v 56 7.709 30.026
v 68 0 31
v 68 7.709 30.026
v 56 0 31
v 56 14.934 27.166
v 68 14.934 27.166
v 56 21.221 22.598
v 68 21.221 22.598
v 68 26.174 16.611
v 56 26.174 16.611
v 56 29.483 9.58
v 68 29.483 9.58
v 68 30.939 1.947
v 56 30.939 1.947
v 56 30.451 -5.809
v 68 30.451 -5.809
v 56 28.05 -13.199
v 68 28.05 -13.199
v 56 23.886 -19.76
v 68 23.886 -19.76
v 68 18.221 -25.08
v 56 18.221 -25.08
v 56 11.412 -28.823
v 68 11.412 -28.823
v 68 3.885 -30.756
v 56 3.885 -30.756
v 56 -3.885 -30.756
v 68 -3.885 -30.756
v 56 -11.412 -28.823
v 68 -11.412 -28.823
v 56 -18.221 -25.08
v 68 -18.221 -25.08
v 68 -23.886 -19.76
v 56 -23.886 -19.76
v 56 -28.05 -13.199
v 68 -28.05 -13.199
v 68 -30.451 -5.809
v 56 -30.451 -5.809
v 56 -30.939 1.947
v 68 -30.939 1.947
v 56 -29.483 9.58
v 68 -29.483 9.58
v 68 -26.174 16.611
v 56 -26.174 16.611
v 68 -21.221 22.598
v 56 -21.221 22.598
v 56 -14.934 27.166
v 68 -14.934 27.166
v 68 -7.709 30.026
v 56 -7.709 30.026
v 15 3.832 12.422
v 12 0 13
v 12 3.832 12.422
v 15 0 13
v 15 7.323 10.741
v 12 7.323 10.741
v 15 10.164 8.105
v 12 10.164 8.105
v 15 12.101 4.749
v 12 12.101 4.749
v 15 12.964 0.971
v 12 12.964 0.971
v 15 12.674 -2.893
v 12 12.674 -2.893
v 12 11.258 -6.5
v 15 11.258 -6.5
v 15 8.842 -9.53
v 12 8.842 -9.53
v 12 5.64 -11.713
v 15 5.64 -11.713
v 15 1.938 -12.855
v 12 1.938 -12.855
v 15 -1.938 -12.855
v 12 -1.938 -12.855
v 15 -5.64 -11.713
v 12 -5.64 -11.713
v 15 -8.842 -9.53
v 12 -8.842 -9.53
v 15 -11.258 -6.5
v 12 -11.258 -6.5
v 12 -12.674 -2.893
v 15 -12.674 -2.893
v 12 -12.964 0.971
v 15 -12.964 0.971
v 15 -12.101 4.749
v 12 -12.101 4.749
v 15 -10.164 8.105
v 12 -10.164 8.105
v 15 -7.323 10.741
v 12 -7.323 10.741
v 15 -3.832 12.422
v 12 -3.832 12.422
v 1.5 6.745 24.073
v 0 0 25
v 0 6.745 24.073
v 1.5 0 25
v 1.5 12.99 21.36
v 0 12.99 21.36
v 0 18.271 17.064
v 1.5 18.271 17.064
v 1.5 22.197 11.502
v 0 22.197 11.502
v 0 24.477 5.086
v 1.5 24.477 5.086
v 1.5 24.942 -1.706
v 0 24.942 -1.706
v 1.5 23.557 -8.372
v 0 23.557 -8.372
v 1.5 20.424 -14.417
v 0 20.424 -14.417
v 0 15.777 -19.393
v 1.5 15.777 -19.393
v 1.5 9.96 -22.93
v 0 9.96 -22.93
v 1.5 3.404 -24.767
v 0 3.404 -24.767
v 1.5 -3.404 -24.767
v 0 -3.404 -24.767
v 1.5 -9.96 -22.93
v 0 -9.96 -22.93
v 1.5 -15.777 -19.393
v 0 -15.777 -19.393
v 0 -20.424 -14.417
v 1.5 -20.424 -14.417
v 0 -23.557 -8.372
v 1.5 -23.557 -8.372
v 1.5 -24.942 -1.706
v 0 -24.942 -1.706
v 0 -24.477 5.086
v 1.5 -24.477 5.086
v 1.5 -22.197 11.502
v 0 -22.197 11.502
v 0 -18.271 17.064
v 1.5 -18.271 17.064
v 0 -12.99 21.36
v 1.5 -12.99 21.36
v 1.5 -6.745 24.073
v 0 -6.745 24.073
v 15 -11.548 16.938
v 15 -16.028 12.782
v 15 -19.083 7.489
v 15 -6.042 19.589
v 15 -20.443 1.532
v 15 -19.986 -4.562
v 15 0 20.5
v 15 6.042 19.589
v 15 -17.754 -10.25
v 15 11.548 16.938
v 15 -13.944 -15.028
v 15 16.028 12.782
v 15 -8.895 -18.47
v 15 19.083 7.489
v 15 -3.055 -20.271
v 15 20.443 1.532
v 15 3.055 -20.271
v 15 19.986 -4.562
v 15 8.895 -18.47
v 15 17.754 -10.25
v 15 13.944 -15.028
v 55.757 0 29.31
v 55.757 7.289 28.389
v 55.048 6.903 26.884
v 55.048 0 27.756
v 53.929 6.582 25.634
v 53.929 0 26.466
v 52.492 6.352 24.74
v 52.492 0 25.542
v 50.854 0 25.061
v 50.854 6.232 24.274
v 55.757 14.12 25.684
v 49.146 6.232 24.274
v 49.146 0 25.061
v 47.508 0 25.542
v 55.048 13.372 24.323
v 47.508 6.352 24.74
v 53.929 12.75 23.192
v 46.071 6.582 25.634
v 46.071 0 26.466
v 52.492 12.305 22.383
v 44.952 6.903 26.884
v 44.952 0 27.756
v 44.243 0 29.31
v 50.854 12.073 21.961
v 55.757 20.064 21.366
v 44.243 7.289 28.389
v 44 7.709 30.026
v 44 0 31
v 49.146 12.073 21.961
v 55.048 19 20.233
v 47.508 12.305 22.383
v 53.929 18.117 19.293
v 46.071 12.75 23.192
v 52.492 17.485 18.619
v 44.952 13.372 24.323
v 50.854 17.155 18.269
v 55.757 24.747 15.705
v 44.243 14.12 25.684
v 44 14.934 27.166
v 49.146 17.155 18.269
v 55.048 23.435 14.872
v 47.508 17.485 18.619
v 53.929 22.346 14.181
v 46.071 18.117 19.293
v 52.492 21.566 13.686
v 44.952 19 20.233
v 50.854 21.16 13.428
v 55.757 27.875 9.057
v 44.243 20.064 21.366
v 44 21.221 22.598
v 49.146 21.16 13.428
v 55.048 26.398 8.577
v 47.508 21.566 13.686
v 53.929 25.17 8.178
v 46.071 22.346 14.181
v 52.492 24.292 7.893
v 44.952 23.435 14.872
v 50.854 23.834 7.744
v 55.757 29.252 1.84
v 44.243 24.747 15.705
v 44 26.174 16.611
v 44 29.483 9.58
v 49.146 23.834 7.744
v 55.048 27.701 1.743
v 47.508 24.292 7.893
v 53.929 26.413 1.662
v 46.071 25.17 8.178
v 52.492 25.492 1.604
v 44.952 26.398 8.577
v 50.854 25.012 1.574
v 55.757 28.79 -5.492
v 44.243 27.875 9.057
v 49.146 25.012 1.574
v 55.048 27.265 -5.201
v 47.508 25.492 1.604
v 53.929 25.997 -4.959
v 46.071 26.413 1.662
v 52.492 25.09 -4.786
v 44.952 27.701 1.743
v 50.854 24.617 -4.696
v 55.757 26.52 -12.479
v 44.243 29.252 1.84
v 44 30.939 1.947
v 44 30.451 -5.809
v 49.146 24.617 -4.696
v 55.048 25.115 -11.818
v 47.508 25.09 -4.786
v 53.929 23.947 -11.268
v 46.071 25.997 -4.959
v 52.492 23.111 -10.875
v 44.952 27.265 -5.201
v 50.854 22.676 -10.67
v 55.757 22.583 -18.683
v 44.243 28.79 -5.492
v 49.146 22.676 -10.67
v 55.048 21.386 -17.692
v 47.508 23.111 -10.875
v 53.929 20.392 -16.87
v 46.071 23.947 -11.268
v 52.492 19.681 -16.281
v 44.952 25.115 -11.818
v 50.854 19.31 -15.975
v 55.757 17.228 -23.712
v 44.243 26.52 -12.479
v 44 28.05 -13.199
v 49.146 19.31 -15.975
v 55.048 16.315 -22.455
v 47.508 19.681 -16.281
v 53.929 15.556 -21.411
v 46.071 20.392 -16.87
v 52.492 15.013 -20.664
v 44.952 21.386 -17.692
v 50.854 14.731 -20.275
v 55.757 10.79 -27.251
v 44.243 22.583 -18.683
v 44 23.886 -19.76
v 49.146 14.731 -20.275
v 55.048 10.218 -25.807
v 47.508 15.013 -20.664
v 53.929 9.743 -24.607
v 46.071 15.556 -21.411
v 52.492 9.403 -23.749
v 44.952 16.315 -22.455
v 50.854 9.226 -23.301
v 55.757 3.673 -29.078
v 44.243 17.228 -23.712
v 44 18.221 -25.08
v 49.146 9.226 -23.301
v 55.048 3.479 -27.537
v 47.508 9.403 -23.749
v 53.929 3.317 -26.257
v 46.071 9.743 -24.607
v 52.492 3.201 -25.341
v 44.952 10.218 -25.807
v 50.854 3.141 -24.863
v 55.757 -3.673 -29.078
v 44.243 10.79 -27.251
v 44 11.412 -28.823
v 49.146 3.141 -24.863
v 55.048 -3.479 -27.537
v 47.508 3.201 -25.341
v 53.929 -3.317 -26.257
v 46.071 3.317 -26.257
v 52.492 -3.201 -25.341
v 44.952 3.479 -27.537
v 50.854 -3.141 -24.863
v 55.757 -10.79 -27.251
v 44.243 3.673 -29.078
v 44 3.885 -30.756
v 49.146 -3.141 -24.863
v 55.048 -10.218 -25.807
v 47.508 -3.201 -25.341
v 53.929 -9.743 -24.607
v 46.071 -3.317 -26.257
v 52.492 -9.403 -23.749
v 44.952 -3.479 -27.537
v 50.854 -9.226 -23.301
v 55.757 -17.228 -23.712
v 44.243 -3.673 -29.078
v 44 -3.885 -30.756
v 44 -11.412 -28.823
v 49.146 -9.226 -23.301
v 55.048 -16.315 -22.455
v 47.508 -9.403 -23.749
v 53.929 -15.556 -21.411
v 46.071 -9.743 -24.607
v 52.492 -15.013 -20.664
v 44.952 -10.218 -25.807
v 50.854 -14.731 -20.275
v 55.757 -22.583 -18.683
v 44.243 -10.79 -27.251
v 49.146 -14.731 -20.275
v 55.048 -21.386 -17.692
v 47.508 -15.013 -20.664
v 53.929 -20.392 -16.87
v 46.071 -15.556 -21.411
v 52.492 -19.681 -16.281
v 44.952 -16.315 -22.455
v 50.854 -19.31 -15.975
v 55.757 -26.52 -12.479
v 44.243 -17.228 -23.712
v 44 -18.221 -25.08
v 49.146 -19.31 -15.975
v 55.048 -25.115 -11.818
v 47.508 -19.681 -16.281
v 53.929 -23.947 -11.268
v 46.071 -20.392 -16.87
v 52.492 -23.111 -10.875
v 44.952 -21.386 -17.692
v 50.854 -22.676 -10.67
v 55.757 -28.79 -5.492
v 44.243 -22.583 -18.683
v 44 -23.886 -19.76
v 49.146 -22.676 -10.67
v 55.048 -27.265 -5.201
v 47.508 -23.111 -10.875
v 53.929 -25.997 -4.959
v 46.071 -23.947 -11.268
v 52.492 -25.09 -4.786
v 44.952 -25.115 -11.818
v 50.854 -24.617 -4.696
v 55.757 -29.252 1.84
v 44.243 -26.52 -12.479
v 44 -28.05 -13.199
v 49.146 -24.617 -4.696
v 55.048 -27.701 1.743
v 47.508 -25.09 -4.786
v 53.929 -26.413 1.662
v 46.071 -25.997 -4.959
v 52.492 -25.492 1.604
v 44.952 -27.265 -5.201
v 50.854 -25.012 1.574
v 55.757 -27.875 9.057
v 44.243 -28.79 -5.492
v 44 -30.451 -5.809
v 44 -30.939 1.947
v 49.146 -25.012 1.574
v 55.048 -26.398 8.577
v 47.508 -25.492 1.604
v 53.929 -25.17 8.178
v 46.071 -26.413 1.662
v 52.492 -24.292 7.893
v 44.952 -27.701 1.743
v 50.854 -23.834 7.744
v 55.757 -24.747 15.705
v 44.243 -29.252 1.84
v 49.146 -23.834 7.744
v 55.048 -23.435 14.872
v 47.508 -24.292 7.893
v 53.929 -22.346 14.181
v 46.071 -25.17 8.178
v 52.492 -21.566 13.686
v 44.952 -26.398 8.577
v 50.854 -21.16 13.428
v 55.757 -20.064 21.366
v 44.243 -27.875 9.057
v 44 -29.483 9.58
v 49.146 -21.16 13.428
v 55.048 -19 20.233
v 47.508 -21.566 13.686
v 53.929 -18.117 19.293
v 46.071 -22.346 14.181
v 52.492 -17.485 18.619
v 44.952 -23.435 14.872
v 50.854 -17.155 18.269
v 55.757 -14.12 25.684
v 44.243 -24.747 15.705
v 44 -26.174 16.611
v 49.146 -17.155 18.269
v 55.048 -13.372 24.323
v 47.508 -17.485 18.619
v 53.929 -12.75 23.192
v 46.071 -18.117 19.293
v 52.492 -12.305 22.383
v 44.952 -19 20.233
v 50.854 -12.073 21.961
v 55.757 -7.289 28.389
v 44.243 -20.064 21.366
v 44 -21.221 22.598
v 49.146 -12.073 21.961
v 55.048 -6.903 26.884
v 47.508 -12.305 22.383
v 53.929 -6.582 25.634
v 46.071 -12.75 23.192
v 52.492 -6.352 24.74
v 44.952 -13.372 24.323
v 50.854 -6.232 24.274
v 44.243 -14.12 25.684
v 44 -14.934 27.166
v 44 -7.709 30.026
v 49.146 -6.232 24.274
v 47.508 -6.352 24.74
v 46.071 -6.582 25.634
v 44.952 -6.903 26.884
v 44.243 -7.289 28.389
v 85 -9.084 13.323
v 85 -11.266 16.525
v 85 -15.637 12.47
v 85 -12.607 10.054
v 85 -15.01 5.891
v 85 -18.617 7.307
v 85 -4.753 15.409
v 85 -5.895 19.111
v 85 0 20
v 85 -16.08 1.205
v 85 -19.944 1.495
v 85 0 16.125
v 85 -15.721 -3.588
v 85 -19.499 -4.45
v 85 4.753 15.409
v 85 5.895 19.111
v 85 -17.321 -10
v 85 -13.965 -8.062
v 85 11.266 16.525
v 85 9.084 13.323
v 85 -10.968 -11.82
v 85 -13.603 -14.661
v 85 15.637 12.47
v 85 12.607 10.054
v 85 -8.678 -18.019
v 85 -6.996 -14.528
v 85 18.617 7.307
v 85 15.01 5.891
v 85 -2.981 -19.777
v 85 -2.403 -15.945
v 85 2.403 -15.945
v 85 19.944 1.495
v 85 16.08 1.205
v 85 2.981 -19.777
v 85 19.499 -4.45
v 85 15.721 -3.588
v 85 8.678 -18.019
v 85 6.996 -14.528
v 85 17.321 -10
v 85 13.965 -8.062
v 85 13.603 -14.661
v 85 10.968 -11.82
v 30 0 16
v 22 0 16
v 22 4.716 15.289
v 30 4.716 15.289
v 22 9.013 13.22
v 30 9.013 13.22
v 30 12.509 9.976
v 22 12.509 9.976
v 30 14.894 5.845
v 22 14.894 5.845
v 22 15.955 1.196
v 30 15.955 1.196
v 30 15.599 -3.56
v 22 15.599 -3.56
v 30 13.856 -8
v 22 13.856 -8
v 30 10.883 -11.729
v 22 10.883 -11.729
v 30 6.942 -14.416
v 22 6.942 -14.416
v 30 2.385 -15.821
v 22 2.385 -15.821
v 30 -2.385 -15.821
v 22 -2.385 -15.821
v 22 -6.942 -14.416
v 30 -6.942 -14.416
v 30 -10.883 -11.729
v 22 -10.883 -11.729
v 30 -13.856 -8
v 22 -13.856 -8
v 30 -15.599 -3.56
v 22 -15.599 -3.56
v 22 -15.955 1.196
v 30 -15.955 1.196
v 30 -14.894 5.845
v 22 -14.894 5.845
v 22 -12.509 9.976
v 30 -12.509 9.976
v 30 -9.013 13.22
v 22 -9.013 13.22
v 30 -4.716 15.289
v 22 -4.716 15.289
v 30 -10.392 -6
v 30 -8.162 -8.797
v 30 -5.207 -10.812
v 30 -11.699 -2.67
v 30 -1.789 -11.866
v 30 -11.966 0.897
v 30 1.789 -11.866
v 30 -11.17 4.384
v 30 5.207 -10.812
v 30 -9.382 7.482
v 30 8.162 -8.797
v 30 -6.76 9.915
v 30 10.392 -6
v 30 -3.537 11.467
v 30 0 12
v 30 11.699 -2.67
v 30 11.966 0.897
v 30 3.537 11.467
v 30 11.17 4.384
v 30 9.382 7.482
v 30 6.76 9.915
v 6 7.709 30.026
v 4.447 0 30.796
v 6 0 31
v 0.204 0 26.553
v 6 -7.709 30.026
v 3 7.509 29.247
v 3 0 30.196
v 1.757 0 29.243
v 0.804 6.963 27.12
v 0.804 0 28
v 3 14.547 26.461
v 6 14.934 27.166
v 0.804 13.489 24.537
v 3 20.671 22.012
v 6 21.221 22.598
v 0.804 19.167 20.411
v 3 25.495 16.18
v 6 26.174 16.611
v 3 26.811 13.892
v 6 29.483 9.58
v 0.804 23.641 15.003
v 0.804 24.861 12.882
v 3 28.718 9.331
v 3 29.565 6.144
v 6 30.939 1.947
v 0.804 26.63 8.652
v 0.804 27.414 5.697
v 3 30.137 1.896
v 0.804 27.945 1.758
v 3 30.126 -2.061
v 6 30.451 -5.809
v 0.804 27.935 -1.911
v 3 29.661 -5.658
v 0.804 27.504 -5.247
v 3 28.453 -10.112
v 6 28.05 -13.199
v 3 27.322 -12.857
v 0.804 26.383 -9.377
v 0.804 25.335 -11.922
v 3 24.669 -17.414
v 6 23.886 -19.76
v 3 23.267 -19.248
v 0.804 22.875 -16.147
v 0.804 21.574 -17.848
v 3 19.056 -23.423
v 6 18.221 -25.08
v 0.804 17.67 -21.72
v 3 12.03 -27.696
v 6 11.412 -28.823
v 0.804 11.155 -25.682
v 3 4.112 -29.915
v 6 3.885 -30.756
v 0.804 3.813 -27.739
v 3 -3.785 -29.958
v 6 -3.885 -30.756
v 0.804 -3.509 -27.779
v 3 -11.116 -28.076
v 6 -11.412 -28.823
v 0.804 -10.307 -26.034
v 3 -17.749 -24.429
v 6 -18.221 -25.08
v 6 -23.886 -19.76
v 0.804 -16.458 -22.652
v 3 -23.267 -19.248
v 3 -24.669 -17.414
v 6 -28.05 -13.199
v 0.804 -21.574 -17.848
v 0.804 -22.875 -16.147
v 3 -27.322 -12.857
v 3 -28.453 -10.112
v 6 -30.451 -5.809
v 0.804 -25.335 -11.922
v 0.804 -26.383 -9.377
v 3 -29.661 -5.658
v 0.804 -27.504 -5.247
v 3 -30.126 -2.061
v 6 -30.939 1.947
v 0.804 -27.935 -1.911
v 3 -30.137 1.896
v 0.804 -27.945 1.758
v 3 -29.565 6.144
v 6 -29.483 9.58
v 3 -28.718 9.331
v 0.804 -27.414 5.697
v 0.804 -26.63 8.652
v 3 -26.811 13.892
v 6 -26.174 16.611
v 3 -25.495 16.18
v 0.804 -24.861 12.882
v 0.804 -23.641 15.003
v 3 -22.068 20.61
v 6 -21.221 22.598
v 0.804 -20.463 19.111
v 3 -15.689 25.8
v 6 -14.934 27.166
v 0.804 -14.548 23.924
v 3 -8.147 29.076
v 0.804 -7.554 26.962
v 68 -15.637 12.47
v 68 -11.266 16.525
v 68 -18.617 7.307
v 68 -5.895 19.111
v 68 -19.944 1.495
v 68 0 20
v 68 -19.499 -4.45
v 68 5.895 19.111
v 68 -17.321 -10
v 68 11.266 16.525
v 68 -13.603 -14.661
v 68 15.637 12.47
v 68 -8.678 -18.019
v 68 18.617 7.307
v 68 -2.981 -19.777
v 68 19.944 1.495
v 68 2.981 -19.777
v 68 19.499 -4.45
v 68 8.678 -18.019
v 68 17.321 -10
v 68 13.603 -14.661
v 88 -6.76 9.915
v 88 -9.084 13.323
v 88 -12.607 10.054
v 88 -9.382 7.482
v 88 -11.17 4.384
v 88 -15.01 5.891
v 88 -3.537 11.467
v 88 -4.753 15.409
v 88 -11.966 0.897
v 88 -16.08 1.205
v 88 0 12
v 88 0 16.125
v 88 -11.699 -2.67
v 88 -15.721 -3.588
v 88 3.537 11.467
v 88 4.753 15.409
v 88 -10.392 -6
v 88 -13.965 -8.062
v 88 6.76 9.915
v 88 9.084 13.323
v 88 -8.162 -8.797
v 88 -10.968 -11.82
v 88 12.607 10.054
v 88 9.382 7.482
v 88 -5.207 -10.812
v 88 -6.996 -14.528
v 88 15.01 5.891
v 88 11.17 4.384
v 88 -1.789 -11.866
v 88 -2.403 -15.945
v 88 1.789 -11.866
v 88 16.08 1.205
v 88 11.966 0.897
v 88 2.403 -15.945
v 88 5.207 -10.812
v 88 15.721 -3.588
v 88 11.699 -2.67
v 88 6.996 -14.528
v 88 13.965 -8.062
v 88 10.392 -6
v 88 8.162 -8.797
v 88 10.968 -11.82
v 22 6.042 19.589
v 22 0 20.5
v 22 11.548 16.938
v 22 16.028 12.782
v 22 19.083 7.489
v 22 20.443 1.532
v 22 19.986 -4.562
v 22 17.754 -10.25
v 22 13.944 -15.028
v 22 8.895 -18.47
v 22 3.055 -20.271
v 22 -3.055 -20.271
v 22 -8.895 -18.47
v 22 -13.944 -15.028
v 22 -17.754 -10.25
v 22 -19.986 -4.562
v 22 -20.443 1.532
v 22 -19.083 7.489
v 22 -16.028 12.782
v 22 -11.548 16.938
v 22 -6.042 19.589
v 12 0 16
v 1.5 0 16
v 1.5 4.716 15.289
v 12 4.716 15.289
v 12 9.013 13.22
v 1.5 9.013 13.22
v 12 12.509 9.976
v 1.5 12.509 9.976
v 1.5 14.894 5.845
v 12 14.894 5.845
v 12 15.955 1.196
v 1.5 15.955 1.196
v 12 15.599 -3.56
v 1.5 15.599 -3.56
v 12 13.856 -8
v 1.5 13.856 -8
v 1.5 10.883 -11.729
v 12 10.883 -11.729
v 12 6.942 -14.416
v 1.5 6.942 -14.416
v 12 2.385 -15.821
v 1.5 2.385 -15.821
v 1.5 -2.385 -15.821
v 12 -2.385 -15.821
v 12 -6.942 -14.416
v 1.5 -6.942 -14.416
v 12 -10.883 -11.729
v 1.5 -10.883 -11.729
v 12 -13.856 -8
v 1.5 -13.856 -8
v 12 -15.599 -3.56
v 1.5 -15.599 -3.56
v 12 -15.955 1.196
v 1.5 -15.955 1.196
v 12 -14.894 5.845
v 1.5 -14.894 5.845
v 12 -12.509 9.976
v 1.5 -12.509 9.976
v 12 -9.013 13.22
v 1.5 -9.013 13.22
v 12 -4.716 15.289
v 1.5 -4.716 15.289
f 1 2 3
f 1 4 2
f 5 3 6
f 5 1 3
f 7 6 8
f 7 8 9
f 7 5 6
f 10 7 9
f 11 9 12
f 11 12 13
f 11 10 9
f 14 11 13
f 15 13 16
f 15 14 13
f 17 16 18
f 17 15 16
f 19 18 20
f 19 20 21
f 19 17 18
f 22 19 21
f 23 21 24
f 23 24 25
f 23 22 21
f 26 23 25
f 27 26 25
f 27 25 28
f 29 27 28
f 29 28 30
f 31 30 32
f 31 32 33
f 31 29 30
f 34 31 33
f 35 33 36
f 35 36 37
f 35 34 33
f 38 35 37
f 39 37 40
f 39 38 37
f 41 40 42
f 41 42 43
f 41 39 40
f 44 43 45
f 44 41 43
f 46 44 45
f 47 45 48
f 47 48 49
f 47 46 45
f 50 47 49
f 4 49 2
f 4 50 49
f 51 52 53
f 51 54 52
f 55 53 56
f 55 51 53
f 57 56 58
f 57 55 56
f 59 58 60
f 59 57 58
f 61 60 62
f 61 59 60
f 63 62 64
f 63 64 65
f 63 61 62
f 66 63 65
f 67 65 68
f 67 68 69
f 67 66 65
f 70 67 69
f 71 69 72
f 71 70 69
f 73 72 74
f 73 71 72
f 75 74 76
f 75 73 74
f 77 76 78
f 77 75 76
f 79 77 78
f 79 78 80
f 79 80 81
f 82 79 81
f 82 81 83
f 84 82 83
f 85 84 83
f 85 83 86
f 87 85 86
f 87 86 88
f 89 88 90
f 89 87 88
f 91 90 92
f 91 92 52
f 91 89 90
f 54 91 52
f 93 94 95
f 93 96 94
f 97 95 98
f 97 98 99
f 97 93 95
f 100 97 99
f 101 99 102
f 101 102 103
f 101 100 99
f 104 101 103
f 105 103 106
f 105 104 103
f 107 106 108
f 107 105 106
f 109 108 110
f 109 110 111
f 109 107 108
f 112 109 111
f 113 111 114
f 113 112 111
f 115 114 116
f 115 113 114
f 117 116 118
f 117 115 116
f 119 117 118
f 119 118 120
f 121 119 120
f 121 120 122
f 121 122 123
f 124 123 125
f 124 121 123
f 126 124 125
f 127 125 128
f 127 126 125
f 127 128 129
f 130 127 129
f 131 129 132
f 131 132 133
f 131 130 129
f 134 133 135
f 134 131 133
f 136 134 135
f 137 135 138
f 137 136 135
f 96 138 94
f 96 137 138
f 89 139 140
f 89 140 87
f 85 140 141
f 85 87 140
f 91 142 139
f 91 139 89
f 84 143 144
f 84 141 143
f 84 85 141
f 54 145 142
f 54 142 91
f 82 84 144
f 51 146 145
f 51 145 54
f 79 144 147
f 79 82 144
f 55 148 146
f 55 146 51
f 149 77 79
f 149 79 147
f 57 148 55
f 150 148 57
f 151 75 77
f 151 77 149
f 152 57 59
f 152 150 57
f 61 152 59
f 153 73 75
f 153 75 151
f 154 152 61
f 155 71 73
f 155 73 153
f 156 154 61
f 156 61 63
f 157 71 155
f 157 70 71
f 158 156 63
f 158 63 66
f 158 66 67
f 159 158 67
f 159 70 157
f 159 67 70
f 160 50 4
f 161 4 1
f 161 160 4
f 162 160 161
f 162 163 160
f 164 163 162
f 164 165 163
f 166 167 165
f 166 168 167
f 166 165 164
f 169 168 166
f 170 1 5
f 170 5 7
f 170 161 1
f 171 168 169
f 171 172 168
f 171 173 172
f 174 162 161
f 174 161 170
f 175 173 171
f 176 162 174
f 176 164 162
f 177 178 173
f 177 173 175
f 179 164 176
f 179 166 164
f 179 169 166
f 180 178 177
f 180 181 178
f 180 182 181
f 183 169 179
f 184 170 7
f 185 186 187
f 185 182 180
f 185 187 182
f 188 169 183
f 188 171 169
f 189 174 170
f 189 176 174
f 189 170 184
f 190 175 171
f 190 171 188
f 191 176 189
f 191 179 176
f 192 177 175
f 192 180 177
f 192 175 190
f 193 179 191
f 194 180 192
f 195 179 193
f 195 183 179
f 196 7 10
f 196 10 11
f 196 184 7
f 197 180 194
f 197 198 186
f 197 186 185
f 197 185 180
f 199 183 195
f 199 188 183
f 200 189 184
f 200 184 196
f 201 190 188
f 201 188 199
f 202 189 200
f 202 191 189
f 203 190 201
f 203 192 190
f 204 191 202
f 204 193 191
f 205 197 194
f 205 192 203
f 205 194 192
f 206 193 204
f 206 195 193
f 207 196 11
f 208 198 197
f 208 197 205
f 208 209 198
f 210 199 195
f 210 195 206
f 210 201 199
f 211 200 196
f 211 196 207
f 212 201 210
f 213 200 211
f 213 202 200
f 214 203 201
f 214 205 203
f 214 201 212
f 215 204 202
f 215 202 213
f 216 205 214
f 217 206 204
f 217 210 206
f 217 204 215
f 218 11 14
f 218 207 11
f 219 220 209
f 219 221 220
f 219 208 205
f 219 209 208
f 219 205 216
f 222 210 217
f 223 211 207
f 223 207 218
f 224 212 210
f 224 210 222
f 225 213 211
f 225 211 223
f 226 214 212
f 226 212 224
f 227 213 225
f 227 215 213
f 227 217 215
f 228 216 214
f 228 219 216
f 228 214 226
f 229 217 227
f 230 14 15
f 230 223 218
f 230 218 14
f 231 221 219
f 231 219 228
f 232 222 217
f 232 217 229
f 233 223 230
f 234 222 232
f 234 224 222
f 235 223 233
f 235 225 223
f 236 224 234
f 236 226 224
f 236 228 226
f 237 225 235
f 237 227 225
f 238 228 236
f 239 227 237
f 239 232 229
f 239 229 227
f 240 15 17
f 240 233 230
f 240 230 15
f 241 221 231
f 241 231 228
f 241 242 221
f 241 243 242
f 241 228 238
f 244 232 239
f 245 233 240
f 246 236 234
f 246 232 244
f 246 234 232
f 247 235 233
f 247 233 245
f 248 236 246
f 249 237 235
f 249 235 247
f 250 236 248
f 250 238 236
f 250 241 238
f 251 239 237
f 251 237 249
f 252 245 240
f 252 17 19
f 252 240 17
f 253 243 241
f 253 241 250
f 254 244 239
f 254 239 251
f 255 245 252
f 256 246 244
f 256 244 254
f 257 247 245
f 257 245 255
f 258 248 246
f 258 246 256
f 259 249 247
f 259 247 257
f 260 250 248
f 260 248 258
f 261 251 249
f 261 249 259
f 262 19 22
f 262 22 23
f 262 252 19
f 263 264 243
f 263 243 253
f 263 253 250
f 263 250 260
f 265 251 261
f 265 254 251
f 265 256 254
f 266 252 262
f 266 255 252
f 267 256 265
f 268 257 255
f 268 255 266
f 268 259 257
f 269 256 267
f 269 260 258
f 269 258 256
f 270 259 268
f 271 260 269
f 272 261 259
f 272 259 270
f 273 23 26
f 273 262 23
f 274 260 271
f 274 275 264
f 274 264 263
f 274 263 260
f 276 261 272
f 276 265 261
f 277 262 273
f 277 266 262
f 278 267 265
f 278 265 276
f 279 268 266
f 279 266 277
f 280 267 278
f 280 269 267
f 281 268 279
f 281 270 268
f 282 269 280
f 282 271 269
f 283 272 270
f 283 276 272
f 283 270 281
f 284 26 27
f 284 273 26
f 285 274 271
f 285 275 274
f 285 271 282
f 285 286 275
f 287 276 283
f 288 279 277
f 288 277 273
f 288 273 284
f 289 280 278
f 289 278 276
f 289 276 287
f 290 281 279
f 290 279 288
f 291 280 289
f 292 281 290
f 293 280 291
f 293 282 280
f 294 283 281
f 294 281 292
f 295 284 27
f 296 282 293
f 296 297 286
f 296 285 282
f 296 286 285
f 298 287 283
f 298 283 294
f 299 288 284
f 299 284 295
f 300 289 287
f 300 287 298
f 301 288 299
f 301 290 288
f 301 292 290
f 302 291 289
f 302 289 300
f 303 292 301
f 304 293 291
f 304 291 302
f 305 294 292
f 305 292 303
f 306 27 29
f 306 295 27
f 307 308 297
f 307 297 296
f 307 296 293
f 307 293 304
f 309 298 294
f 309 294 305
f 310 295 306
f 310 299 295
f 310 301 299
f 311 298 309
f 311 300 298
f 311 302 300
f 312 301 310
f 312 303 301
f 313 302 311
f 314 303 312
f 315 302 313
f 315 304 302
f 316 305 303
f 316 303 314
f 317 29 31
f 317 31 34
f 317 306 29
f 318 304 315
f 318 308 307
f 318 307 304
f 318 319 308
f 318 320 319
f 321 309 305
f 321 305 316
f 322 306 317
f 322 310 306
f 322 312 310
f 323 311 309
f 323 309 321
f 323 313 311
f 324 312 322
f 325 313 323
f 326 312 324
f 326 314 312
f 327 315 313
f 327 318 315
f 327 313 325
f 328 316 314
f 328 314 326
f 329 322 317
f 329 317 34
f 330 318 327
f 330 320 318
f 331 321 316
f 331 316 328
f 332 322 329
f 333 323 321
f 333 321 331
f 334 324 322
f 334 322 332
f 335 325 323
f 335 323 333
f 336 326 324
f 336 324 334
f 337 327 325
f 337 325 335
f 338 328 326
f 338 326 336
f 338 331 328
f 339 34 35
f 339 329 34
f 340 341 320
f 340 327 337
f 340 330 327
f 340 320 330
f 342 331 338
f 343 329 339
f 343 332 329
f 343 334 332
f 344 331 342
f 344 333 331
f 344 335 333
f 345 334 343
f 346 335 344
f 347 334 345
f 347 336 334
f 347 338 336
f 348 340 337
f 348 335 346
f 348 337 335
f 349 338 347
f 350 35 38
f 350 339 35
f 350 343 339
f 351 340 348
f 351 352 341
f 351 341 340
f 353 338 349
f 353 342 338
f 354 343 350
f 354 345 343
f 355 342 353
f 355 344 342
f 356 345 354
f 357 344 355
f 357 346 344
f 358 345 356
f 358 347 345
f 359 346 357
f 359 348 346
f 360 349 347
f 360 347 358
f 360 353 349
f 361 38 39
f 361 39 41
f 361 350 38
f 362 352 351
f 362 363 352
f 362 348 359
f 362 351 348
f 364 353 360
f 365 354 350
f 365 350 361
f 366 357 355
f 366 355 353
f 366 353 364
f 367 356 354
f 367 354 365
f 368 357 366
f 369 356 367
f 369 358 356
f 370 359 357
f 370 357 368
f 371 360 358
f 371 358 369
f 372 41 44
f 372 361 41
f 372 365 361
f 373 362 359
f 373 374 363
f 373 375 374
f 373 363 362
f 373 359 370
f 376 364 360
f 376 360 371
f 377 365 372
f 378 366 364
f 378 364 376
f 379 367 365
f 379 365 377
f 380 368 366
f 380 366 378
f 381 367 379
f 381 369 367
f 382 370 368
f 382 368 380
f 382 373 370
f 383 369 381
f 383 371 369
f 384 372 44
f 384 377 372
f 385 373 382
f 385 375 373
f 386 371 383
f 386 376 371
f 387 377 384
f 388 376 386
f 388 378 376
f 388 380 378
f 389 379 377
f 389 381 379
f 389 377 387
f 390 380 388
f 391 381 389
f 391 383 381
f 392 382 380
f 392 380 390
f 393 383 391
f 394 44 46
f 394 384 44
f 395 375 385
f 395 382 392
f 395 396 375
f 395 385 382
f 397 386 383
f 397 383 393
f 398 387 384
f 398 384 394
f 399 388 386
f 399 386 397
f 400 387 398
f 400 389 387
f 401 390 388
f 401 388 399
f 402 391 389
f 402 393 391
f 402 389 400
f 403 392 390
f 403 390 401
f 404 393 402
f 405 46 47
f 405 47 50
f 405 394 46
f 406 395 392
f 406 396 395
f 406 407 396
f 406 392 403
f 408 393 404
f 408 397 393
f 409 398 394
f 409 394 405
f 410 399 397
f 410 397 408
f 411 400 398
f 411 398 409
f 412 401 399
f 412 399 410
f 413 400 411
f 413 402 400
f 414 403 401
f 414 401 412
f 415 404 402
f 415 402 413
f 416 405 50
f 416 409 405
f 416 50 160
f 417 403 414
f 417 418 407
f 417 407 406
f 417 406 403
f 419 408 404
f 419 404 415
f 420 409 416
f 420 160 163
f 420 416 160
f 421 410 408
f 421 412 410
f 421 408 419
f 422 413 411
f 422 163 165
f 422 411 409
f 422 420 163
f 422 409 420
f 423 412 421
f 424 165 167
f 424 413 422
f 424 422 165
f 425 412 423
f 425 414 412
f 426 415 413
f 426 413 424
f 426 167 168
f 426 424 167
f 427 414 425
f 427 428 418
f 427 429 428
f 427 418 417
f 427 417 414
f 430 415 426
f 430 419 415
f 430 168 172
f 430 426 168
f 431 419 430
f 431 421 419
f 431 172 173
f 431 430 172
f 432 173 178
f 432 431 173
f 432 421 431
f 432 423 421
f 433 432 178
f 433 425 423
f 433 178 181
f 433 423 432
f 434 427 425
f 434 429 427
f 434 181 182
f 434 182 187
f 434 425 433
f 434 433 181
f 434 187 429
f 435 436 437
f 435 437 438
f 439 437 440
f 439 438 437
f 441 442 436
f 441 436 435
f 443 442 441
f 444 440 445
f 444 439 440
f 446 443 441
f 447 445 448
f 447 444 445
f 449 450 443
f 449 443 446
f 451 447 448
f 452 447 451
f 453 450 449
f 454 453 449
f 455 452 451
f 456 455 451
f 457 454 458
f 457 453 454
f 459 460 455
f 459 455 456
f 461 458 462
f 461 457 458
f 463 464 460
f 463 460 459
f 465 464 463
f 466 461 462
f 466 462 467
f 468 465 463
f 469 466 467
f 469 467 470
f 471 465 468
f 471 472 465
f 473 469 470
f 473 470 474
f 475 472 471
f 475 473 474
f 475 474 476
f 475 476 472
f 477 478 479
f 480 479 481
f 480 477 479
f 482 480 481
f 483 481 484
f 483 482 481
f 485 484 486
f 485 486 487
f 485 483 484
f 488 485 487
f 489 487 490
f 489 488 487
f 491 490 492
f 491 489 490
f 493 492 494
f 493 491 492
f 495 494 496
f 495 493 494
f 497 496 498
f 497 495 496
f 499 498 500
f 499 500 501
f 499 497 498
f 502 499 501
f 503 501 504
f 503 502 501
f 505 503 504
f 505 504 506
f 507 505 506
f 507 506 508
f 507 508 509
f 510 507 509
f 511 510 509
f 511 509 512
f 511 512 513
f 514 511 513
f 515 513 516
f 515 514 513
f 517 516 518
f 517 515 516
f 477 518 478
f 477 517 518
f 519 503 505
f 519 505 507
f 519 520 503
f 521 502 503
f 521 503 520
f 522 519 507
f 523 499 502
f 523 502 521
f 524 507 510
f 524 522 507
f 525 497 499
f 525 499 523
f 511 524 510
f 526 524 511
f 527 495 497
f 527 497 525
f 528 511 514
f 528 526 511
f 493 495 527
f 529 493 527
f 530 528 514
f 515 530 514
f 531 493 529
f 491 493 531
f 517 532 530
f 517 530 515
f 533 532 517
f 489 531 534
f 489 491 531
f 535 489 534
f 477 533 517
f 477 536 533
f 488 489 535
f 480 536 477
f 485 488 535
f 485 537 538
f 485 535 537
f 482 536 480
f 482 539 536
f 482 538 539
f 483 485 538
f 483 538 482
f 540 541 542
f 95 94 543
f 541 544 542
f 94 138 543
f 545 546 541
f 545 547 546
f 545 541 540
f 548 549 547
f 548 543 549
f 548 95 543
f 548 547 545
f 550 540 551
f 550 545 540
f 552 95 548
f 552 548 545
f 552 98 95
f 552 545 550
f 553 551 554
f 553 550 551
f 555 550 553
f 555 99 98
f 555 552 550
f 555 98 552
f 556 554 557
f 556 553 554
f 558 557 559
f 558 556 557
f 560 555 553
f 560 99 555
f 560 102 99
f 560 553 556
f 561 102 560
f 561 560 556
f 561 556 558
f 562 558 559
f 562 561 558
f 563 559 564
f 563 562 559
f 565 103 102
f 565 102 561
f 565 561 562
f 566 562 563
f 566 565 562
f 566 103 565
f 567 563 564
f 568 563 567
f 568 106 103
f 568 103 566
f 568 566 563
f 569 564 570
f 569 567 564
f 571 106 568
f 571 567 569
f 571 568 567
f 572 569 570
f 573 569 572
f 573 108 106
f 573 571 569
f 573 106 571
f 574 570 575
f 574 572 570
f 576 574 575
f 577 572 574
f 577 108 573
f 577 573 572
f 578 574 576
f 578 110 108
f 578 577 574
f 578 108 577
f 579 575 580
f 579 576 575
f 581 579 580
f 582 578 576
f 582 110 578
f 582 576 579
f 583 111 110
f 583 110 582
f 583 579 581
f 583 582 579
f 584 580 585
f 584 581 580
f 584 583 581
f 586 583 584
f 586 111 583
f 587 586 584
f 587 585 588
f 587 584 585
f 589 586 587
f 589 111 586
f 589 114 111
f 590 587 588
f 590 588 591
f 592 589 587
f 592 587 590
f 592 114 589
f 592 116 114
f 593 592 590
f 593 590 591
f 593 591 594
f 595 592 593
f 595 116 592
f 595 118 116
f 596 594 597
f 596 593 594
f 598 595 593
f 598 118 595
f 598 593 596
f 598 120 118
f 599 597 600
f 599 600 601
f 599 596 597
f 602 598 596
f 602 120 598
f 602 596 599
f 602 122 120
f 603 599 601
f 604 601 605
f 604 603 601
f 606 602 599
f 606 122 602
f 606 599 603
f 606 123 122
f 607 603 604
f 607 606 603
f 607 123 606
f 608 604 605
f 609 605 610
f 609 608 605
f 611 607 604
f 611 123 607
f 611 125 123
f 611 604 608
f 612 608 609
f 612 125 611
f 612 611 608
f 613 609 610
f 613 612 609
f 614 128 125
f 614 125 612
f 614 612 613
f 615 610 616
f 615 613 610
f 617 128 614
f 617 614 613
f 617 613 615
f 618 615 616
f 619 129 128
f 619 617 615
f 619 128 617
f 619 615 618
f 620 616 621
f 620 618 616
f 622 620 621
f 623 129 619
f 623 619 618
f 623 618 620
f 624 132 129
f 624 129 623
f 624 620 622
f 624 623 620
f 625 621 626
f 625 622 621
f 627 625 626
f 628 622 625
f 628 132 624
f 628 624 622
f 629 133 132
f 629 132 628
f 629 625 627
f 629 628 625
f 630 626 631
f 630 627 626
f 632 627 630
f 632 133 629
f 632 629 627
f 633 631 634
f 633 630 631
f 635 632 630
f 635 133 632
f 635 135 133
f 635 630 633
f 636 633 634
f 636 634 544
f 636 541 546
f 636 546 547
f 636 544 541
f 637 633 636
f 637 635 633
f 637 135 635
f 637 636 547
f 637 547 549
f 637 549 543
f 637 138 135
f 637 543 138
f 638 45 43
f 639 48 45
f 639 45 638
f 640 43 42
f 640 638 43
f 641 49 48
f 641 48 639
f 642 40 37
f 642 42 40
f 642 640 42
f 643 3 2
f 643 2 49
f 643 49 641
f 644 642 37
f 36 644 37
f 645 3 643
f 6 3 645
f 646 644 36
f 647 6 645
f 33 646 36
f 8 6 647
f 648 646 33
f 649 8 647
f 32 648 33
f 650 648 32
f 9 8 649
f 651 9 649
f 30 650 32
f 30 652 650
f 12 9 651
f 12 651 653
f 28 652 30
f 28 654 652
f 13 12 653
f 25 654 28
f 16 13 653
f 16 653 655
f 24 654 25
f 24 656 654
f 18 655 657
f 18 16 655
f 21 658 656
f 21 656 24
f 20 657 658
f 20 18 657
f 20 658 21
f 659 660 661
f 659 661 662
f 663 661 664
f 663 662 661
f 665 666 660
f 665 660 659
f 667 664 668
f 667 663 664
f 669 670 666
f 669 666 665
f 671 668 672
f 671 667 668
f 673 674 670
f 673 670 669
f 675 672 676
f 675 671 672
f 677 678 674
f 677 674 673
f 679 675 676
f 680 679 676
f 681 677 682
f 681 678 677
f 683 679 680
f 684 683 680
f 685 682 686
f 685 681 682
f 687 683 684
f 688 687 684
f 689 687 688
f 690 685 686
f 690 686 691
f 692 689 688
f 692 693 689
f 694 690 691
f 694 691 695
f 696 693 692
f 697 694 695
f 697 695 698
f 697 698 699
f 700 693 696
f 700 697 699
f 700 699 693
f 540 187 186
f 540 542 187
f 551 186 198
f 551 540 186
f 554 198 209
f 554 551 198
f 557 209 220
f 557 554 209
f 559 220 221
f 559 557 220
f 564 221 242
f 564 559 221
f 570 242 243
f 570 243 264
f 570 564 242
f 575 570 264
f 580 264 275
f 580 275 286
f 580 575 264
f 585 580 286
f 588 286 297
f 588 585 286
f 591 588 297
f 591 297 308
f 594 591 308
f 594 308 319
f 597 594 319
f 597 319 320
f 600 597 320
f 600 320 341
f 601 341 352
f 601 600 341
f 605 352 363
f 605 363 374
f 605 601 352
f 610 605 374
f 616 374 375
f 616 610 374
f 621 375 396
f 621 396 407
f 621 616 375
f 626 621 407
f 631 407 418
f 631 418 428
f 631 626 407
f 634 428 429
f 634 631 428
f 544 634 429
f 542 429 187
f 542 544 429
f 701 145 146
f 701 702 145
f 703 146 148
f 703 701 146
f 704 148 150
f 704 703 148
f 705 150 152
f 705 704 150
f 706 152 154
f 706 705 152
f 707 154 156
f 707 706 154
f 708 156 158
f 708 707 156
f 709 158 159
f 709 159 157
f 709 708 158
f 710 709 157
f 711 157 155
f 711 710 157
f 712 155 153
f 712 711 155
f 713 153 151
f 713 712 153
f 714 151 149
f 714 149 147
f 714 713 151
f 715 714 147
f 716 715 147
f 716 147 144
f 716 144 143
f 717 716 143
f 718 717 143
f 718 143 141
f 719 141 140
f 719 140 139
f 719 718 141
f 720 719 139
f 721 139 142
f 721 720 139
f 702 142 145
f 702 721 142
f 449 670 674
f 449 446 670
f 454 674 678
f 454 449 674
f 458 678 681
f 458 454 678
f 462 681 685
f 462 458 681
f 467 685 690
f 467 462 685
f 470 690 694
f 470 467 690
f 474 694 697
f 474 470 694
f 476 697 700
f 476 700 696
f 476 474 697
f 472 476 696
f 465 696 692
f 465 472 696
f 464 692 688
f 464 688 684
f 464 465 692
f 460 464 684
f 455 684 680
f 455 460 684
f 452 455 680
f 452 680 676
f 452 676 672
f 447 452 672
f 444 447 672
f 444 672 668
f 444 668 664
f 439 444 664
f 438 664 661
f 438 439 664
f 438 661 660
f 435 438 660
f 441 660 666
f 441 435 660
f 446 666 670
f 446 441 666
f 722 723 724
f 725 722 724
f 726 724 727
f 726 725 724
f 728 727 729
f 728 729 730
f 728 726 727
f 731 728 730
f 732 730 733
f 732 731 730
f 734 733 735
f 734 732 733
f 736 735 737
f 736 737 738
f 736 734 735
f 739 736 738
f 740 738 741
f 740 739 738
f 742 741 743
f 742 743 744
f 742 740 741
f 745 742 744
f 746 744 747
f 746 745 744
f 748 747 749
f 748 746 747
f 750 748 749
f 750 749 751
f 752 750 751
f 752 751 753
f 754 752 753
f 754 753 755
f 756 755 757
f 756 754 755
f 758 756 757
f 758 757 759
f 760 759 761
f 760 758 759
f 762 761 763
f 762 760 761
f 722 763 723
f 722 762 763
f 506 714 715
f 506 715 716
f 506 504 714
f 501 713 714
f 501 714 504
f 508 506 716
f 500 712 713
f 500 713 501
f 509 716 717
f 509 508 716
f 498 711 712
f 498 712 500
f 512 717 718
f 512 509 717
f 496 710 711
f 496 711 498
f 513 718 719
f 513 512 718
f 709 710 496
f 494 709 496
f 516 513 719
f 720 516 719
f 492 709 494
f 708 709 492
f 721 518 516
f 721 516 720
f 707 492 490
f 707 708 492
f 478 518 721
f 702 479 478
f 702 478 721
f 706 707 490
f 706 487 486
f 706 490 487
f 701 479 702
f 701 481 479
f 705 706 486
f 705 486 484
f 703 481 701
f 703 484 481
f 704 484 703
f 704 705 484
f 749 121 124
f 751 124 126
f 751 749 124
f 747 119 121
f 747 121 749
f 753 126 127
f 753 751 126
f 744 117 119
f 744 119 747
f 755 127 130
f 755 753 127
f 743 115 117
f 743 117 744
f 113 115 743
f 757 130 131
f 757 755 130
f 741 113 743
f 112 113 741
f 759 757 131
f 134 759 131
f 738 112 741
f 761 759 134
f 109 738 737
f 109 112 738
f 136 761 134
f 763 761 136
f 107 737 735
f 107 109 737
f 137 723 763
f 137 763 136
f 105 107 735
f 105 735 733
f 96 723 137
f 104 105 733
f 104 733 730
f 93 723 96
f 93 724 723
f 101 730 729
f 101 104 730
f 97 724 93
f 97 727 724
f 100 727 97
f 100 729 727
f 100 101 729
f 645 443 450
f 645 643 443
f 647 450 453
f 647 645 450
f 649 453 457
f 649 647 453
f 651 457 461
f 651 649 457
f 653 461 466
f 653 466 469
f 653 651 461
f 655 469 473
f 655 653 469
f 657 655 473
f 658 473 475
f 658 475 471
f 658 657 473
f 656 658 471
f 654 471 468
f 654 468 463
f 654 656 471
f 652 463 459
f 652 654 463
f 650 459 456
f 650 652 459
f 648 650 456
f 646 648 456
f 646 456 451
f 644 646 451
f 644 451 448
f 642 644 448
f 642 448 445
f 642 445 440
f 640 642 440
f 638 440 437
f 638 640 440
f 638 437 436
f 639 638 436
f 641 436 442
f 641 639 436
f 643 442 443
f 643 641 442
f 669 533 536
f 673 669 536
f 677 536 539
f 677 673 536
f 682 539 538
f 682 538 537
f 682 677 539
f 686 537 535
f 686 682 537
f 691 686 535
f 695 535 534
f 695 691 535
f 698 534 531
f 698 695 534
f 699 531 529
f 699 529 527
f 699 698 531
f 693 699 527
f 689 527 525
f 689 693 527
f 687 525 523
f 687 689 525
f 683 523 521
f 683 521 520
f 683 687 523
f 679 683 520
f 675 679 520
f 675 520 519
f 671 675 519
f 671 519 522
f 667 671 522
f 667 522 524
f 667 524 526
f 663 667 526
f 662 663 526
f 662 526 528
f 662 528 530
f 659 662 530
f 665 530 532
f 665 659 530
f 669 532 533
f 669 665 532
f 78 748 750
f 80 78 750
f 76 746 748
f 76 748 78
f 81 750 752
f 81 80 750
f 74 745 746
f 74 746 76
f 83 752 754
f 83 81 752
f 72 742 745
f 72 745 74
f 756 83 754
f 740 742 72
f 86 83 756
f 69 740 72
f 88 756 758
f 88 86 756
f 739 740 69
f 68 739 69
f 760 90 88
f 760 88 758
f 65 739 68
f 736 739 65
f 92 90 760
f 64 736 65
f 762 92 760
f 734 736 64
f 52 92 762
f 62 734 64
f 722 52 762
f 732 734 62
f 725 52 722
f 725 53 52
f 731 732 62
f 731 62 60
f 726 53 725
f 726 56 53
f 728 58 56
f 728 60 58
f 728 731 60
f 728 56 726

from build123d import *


with BuildPart() as f1:
    # F0 (on Front) → F1 (revolve)
    with BuildSketch(Plane.XZ):
        with BuildLine():
            ThreePointArc((6, 31), (1.757359, 29.242641), (0, 25))
            Line((0, 25), (1.5, 25))
            Line((1.5, 25), (1.5, 16))
            Line((1.5, 16), (12, 16))
            Line((12, 16), (12, 13))
            Line((12, 13), (15, 13))
            Line((15, 13), (15, 20.5))
            Line((15, 20.5), (22, 20.5))
            Line((22, 20.5), (22, 16))
            Line((22, 16), (30, 16))
            Line((30, 16), (30, 12))
            Line((30, 12), (88, 12))
            Line((88, 12), (88, 16.124999))
            Line((88, 16.124999), (85, 16.124999))
            Line((85, 16.124999), (85, 20))
            Line((85, 20), (68, 20))
            Line((68, 20), (68, 31))
            Line((68, 31), (56, 31))
            ThreePointArc((56, 31), (50, 25), (44, 31))
            Line((44, 31), (6, 31))
        make_face()
    revolve(axis=Axis((44, 0, 0), (-1, 0, 0)))


solid = f1.part
